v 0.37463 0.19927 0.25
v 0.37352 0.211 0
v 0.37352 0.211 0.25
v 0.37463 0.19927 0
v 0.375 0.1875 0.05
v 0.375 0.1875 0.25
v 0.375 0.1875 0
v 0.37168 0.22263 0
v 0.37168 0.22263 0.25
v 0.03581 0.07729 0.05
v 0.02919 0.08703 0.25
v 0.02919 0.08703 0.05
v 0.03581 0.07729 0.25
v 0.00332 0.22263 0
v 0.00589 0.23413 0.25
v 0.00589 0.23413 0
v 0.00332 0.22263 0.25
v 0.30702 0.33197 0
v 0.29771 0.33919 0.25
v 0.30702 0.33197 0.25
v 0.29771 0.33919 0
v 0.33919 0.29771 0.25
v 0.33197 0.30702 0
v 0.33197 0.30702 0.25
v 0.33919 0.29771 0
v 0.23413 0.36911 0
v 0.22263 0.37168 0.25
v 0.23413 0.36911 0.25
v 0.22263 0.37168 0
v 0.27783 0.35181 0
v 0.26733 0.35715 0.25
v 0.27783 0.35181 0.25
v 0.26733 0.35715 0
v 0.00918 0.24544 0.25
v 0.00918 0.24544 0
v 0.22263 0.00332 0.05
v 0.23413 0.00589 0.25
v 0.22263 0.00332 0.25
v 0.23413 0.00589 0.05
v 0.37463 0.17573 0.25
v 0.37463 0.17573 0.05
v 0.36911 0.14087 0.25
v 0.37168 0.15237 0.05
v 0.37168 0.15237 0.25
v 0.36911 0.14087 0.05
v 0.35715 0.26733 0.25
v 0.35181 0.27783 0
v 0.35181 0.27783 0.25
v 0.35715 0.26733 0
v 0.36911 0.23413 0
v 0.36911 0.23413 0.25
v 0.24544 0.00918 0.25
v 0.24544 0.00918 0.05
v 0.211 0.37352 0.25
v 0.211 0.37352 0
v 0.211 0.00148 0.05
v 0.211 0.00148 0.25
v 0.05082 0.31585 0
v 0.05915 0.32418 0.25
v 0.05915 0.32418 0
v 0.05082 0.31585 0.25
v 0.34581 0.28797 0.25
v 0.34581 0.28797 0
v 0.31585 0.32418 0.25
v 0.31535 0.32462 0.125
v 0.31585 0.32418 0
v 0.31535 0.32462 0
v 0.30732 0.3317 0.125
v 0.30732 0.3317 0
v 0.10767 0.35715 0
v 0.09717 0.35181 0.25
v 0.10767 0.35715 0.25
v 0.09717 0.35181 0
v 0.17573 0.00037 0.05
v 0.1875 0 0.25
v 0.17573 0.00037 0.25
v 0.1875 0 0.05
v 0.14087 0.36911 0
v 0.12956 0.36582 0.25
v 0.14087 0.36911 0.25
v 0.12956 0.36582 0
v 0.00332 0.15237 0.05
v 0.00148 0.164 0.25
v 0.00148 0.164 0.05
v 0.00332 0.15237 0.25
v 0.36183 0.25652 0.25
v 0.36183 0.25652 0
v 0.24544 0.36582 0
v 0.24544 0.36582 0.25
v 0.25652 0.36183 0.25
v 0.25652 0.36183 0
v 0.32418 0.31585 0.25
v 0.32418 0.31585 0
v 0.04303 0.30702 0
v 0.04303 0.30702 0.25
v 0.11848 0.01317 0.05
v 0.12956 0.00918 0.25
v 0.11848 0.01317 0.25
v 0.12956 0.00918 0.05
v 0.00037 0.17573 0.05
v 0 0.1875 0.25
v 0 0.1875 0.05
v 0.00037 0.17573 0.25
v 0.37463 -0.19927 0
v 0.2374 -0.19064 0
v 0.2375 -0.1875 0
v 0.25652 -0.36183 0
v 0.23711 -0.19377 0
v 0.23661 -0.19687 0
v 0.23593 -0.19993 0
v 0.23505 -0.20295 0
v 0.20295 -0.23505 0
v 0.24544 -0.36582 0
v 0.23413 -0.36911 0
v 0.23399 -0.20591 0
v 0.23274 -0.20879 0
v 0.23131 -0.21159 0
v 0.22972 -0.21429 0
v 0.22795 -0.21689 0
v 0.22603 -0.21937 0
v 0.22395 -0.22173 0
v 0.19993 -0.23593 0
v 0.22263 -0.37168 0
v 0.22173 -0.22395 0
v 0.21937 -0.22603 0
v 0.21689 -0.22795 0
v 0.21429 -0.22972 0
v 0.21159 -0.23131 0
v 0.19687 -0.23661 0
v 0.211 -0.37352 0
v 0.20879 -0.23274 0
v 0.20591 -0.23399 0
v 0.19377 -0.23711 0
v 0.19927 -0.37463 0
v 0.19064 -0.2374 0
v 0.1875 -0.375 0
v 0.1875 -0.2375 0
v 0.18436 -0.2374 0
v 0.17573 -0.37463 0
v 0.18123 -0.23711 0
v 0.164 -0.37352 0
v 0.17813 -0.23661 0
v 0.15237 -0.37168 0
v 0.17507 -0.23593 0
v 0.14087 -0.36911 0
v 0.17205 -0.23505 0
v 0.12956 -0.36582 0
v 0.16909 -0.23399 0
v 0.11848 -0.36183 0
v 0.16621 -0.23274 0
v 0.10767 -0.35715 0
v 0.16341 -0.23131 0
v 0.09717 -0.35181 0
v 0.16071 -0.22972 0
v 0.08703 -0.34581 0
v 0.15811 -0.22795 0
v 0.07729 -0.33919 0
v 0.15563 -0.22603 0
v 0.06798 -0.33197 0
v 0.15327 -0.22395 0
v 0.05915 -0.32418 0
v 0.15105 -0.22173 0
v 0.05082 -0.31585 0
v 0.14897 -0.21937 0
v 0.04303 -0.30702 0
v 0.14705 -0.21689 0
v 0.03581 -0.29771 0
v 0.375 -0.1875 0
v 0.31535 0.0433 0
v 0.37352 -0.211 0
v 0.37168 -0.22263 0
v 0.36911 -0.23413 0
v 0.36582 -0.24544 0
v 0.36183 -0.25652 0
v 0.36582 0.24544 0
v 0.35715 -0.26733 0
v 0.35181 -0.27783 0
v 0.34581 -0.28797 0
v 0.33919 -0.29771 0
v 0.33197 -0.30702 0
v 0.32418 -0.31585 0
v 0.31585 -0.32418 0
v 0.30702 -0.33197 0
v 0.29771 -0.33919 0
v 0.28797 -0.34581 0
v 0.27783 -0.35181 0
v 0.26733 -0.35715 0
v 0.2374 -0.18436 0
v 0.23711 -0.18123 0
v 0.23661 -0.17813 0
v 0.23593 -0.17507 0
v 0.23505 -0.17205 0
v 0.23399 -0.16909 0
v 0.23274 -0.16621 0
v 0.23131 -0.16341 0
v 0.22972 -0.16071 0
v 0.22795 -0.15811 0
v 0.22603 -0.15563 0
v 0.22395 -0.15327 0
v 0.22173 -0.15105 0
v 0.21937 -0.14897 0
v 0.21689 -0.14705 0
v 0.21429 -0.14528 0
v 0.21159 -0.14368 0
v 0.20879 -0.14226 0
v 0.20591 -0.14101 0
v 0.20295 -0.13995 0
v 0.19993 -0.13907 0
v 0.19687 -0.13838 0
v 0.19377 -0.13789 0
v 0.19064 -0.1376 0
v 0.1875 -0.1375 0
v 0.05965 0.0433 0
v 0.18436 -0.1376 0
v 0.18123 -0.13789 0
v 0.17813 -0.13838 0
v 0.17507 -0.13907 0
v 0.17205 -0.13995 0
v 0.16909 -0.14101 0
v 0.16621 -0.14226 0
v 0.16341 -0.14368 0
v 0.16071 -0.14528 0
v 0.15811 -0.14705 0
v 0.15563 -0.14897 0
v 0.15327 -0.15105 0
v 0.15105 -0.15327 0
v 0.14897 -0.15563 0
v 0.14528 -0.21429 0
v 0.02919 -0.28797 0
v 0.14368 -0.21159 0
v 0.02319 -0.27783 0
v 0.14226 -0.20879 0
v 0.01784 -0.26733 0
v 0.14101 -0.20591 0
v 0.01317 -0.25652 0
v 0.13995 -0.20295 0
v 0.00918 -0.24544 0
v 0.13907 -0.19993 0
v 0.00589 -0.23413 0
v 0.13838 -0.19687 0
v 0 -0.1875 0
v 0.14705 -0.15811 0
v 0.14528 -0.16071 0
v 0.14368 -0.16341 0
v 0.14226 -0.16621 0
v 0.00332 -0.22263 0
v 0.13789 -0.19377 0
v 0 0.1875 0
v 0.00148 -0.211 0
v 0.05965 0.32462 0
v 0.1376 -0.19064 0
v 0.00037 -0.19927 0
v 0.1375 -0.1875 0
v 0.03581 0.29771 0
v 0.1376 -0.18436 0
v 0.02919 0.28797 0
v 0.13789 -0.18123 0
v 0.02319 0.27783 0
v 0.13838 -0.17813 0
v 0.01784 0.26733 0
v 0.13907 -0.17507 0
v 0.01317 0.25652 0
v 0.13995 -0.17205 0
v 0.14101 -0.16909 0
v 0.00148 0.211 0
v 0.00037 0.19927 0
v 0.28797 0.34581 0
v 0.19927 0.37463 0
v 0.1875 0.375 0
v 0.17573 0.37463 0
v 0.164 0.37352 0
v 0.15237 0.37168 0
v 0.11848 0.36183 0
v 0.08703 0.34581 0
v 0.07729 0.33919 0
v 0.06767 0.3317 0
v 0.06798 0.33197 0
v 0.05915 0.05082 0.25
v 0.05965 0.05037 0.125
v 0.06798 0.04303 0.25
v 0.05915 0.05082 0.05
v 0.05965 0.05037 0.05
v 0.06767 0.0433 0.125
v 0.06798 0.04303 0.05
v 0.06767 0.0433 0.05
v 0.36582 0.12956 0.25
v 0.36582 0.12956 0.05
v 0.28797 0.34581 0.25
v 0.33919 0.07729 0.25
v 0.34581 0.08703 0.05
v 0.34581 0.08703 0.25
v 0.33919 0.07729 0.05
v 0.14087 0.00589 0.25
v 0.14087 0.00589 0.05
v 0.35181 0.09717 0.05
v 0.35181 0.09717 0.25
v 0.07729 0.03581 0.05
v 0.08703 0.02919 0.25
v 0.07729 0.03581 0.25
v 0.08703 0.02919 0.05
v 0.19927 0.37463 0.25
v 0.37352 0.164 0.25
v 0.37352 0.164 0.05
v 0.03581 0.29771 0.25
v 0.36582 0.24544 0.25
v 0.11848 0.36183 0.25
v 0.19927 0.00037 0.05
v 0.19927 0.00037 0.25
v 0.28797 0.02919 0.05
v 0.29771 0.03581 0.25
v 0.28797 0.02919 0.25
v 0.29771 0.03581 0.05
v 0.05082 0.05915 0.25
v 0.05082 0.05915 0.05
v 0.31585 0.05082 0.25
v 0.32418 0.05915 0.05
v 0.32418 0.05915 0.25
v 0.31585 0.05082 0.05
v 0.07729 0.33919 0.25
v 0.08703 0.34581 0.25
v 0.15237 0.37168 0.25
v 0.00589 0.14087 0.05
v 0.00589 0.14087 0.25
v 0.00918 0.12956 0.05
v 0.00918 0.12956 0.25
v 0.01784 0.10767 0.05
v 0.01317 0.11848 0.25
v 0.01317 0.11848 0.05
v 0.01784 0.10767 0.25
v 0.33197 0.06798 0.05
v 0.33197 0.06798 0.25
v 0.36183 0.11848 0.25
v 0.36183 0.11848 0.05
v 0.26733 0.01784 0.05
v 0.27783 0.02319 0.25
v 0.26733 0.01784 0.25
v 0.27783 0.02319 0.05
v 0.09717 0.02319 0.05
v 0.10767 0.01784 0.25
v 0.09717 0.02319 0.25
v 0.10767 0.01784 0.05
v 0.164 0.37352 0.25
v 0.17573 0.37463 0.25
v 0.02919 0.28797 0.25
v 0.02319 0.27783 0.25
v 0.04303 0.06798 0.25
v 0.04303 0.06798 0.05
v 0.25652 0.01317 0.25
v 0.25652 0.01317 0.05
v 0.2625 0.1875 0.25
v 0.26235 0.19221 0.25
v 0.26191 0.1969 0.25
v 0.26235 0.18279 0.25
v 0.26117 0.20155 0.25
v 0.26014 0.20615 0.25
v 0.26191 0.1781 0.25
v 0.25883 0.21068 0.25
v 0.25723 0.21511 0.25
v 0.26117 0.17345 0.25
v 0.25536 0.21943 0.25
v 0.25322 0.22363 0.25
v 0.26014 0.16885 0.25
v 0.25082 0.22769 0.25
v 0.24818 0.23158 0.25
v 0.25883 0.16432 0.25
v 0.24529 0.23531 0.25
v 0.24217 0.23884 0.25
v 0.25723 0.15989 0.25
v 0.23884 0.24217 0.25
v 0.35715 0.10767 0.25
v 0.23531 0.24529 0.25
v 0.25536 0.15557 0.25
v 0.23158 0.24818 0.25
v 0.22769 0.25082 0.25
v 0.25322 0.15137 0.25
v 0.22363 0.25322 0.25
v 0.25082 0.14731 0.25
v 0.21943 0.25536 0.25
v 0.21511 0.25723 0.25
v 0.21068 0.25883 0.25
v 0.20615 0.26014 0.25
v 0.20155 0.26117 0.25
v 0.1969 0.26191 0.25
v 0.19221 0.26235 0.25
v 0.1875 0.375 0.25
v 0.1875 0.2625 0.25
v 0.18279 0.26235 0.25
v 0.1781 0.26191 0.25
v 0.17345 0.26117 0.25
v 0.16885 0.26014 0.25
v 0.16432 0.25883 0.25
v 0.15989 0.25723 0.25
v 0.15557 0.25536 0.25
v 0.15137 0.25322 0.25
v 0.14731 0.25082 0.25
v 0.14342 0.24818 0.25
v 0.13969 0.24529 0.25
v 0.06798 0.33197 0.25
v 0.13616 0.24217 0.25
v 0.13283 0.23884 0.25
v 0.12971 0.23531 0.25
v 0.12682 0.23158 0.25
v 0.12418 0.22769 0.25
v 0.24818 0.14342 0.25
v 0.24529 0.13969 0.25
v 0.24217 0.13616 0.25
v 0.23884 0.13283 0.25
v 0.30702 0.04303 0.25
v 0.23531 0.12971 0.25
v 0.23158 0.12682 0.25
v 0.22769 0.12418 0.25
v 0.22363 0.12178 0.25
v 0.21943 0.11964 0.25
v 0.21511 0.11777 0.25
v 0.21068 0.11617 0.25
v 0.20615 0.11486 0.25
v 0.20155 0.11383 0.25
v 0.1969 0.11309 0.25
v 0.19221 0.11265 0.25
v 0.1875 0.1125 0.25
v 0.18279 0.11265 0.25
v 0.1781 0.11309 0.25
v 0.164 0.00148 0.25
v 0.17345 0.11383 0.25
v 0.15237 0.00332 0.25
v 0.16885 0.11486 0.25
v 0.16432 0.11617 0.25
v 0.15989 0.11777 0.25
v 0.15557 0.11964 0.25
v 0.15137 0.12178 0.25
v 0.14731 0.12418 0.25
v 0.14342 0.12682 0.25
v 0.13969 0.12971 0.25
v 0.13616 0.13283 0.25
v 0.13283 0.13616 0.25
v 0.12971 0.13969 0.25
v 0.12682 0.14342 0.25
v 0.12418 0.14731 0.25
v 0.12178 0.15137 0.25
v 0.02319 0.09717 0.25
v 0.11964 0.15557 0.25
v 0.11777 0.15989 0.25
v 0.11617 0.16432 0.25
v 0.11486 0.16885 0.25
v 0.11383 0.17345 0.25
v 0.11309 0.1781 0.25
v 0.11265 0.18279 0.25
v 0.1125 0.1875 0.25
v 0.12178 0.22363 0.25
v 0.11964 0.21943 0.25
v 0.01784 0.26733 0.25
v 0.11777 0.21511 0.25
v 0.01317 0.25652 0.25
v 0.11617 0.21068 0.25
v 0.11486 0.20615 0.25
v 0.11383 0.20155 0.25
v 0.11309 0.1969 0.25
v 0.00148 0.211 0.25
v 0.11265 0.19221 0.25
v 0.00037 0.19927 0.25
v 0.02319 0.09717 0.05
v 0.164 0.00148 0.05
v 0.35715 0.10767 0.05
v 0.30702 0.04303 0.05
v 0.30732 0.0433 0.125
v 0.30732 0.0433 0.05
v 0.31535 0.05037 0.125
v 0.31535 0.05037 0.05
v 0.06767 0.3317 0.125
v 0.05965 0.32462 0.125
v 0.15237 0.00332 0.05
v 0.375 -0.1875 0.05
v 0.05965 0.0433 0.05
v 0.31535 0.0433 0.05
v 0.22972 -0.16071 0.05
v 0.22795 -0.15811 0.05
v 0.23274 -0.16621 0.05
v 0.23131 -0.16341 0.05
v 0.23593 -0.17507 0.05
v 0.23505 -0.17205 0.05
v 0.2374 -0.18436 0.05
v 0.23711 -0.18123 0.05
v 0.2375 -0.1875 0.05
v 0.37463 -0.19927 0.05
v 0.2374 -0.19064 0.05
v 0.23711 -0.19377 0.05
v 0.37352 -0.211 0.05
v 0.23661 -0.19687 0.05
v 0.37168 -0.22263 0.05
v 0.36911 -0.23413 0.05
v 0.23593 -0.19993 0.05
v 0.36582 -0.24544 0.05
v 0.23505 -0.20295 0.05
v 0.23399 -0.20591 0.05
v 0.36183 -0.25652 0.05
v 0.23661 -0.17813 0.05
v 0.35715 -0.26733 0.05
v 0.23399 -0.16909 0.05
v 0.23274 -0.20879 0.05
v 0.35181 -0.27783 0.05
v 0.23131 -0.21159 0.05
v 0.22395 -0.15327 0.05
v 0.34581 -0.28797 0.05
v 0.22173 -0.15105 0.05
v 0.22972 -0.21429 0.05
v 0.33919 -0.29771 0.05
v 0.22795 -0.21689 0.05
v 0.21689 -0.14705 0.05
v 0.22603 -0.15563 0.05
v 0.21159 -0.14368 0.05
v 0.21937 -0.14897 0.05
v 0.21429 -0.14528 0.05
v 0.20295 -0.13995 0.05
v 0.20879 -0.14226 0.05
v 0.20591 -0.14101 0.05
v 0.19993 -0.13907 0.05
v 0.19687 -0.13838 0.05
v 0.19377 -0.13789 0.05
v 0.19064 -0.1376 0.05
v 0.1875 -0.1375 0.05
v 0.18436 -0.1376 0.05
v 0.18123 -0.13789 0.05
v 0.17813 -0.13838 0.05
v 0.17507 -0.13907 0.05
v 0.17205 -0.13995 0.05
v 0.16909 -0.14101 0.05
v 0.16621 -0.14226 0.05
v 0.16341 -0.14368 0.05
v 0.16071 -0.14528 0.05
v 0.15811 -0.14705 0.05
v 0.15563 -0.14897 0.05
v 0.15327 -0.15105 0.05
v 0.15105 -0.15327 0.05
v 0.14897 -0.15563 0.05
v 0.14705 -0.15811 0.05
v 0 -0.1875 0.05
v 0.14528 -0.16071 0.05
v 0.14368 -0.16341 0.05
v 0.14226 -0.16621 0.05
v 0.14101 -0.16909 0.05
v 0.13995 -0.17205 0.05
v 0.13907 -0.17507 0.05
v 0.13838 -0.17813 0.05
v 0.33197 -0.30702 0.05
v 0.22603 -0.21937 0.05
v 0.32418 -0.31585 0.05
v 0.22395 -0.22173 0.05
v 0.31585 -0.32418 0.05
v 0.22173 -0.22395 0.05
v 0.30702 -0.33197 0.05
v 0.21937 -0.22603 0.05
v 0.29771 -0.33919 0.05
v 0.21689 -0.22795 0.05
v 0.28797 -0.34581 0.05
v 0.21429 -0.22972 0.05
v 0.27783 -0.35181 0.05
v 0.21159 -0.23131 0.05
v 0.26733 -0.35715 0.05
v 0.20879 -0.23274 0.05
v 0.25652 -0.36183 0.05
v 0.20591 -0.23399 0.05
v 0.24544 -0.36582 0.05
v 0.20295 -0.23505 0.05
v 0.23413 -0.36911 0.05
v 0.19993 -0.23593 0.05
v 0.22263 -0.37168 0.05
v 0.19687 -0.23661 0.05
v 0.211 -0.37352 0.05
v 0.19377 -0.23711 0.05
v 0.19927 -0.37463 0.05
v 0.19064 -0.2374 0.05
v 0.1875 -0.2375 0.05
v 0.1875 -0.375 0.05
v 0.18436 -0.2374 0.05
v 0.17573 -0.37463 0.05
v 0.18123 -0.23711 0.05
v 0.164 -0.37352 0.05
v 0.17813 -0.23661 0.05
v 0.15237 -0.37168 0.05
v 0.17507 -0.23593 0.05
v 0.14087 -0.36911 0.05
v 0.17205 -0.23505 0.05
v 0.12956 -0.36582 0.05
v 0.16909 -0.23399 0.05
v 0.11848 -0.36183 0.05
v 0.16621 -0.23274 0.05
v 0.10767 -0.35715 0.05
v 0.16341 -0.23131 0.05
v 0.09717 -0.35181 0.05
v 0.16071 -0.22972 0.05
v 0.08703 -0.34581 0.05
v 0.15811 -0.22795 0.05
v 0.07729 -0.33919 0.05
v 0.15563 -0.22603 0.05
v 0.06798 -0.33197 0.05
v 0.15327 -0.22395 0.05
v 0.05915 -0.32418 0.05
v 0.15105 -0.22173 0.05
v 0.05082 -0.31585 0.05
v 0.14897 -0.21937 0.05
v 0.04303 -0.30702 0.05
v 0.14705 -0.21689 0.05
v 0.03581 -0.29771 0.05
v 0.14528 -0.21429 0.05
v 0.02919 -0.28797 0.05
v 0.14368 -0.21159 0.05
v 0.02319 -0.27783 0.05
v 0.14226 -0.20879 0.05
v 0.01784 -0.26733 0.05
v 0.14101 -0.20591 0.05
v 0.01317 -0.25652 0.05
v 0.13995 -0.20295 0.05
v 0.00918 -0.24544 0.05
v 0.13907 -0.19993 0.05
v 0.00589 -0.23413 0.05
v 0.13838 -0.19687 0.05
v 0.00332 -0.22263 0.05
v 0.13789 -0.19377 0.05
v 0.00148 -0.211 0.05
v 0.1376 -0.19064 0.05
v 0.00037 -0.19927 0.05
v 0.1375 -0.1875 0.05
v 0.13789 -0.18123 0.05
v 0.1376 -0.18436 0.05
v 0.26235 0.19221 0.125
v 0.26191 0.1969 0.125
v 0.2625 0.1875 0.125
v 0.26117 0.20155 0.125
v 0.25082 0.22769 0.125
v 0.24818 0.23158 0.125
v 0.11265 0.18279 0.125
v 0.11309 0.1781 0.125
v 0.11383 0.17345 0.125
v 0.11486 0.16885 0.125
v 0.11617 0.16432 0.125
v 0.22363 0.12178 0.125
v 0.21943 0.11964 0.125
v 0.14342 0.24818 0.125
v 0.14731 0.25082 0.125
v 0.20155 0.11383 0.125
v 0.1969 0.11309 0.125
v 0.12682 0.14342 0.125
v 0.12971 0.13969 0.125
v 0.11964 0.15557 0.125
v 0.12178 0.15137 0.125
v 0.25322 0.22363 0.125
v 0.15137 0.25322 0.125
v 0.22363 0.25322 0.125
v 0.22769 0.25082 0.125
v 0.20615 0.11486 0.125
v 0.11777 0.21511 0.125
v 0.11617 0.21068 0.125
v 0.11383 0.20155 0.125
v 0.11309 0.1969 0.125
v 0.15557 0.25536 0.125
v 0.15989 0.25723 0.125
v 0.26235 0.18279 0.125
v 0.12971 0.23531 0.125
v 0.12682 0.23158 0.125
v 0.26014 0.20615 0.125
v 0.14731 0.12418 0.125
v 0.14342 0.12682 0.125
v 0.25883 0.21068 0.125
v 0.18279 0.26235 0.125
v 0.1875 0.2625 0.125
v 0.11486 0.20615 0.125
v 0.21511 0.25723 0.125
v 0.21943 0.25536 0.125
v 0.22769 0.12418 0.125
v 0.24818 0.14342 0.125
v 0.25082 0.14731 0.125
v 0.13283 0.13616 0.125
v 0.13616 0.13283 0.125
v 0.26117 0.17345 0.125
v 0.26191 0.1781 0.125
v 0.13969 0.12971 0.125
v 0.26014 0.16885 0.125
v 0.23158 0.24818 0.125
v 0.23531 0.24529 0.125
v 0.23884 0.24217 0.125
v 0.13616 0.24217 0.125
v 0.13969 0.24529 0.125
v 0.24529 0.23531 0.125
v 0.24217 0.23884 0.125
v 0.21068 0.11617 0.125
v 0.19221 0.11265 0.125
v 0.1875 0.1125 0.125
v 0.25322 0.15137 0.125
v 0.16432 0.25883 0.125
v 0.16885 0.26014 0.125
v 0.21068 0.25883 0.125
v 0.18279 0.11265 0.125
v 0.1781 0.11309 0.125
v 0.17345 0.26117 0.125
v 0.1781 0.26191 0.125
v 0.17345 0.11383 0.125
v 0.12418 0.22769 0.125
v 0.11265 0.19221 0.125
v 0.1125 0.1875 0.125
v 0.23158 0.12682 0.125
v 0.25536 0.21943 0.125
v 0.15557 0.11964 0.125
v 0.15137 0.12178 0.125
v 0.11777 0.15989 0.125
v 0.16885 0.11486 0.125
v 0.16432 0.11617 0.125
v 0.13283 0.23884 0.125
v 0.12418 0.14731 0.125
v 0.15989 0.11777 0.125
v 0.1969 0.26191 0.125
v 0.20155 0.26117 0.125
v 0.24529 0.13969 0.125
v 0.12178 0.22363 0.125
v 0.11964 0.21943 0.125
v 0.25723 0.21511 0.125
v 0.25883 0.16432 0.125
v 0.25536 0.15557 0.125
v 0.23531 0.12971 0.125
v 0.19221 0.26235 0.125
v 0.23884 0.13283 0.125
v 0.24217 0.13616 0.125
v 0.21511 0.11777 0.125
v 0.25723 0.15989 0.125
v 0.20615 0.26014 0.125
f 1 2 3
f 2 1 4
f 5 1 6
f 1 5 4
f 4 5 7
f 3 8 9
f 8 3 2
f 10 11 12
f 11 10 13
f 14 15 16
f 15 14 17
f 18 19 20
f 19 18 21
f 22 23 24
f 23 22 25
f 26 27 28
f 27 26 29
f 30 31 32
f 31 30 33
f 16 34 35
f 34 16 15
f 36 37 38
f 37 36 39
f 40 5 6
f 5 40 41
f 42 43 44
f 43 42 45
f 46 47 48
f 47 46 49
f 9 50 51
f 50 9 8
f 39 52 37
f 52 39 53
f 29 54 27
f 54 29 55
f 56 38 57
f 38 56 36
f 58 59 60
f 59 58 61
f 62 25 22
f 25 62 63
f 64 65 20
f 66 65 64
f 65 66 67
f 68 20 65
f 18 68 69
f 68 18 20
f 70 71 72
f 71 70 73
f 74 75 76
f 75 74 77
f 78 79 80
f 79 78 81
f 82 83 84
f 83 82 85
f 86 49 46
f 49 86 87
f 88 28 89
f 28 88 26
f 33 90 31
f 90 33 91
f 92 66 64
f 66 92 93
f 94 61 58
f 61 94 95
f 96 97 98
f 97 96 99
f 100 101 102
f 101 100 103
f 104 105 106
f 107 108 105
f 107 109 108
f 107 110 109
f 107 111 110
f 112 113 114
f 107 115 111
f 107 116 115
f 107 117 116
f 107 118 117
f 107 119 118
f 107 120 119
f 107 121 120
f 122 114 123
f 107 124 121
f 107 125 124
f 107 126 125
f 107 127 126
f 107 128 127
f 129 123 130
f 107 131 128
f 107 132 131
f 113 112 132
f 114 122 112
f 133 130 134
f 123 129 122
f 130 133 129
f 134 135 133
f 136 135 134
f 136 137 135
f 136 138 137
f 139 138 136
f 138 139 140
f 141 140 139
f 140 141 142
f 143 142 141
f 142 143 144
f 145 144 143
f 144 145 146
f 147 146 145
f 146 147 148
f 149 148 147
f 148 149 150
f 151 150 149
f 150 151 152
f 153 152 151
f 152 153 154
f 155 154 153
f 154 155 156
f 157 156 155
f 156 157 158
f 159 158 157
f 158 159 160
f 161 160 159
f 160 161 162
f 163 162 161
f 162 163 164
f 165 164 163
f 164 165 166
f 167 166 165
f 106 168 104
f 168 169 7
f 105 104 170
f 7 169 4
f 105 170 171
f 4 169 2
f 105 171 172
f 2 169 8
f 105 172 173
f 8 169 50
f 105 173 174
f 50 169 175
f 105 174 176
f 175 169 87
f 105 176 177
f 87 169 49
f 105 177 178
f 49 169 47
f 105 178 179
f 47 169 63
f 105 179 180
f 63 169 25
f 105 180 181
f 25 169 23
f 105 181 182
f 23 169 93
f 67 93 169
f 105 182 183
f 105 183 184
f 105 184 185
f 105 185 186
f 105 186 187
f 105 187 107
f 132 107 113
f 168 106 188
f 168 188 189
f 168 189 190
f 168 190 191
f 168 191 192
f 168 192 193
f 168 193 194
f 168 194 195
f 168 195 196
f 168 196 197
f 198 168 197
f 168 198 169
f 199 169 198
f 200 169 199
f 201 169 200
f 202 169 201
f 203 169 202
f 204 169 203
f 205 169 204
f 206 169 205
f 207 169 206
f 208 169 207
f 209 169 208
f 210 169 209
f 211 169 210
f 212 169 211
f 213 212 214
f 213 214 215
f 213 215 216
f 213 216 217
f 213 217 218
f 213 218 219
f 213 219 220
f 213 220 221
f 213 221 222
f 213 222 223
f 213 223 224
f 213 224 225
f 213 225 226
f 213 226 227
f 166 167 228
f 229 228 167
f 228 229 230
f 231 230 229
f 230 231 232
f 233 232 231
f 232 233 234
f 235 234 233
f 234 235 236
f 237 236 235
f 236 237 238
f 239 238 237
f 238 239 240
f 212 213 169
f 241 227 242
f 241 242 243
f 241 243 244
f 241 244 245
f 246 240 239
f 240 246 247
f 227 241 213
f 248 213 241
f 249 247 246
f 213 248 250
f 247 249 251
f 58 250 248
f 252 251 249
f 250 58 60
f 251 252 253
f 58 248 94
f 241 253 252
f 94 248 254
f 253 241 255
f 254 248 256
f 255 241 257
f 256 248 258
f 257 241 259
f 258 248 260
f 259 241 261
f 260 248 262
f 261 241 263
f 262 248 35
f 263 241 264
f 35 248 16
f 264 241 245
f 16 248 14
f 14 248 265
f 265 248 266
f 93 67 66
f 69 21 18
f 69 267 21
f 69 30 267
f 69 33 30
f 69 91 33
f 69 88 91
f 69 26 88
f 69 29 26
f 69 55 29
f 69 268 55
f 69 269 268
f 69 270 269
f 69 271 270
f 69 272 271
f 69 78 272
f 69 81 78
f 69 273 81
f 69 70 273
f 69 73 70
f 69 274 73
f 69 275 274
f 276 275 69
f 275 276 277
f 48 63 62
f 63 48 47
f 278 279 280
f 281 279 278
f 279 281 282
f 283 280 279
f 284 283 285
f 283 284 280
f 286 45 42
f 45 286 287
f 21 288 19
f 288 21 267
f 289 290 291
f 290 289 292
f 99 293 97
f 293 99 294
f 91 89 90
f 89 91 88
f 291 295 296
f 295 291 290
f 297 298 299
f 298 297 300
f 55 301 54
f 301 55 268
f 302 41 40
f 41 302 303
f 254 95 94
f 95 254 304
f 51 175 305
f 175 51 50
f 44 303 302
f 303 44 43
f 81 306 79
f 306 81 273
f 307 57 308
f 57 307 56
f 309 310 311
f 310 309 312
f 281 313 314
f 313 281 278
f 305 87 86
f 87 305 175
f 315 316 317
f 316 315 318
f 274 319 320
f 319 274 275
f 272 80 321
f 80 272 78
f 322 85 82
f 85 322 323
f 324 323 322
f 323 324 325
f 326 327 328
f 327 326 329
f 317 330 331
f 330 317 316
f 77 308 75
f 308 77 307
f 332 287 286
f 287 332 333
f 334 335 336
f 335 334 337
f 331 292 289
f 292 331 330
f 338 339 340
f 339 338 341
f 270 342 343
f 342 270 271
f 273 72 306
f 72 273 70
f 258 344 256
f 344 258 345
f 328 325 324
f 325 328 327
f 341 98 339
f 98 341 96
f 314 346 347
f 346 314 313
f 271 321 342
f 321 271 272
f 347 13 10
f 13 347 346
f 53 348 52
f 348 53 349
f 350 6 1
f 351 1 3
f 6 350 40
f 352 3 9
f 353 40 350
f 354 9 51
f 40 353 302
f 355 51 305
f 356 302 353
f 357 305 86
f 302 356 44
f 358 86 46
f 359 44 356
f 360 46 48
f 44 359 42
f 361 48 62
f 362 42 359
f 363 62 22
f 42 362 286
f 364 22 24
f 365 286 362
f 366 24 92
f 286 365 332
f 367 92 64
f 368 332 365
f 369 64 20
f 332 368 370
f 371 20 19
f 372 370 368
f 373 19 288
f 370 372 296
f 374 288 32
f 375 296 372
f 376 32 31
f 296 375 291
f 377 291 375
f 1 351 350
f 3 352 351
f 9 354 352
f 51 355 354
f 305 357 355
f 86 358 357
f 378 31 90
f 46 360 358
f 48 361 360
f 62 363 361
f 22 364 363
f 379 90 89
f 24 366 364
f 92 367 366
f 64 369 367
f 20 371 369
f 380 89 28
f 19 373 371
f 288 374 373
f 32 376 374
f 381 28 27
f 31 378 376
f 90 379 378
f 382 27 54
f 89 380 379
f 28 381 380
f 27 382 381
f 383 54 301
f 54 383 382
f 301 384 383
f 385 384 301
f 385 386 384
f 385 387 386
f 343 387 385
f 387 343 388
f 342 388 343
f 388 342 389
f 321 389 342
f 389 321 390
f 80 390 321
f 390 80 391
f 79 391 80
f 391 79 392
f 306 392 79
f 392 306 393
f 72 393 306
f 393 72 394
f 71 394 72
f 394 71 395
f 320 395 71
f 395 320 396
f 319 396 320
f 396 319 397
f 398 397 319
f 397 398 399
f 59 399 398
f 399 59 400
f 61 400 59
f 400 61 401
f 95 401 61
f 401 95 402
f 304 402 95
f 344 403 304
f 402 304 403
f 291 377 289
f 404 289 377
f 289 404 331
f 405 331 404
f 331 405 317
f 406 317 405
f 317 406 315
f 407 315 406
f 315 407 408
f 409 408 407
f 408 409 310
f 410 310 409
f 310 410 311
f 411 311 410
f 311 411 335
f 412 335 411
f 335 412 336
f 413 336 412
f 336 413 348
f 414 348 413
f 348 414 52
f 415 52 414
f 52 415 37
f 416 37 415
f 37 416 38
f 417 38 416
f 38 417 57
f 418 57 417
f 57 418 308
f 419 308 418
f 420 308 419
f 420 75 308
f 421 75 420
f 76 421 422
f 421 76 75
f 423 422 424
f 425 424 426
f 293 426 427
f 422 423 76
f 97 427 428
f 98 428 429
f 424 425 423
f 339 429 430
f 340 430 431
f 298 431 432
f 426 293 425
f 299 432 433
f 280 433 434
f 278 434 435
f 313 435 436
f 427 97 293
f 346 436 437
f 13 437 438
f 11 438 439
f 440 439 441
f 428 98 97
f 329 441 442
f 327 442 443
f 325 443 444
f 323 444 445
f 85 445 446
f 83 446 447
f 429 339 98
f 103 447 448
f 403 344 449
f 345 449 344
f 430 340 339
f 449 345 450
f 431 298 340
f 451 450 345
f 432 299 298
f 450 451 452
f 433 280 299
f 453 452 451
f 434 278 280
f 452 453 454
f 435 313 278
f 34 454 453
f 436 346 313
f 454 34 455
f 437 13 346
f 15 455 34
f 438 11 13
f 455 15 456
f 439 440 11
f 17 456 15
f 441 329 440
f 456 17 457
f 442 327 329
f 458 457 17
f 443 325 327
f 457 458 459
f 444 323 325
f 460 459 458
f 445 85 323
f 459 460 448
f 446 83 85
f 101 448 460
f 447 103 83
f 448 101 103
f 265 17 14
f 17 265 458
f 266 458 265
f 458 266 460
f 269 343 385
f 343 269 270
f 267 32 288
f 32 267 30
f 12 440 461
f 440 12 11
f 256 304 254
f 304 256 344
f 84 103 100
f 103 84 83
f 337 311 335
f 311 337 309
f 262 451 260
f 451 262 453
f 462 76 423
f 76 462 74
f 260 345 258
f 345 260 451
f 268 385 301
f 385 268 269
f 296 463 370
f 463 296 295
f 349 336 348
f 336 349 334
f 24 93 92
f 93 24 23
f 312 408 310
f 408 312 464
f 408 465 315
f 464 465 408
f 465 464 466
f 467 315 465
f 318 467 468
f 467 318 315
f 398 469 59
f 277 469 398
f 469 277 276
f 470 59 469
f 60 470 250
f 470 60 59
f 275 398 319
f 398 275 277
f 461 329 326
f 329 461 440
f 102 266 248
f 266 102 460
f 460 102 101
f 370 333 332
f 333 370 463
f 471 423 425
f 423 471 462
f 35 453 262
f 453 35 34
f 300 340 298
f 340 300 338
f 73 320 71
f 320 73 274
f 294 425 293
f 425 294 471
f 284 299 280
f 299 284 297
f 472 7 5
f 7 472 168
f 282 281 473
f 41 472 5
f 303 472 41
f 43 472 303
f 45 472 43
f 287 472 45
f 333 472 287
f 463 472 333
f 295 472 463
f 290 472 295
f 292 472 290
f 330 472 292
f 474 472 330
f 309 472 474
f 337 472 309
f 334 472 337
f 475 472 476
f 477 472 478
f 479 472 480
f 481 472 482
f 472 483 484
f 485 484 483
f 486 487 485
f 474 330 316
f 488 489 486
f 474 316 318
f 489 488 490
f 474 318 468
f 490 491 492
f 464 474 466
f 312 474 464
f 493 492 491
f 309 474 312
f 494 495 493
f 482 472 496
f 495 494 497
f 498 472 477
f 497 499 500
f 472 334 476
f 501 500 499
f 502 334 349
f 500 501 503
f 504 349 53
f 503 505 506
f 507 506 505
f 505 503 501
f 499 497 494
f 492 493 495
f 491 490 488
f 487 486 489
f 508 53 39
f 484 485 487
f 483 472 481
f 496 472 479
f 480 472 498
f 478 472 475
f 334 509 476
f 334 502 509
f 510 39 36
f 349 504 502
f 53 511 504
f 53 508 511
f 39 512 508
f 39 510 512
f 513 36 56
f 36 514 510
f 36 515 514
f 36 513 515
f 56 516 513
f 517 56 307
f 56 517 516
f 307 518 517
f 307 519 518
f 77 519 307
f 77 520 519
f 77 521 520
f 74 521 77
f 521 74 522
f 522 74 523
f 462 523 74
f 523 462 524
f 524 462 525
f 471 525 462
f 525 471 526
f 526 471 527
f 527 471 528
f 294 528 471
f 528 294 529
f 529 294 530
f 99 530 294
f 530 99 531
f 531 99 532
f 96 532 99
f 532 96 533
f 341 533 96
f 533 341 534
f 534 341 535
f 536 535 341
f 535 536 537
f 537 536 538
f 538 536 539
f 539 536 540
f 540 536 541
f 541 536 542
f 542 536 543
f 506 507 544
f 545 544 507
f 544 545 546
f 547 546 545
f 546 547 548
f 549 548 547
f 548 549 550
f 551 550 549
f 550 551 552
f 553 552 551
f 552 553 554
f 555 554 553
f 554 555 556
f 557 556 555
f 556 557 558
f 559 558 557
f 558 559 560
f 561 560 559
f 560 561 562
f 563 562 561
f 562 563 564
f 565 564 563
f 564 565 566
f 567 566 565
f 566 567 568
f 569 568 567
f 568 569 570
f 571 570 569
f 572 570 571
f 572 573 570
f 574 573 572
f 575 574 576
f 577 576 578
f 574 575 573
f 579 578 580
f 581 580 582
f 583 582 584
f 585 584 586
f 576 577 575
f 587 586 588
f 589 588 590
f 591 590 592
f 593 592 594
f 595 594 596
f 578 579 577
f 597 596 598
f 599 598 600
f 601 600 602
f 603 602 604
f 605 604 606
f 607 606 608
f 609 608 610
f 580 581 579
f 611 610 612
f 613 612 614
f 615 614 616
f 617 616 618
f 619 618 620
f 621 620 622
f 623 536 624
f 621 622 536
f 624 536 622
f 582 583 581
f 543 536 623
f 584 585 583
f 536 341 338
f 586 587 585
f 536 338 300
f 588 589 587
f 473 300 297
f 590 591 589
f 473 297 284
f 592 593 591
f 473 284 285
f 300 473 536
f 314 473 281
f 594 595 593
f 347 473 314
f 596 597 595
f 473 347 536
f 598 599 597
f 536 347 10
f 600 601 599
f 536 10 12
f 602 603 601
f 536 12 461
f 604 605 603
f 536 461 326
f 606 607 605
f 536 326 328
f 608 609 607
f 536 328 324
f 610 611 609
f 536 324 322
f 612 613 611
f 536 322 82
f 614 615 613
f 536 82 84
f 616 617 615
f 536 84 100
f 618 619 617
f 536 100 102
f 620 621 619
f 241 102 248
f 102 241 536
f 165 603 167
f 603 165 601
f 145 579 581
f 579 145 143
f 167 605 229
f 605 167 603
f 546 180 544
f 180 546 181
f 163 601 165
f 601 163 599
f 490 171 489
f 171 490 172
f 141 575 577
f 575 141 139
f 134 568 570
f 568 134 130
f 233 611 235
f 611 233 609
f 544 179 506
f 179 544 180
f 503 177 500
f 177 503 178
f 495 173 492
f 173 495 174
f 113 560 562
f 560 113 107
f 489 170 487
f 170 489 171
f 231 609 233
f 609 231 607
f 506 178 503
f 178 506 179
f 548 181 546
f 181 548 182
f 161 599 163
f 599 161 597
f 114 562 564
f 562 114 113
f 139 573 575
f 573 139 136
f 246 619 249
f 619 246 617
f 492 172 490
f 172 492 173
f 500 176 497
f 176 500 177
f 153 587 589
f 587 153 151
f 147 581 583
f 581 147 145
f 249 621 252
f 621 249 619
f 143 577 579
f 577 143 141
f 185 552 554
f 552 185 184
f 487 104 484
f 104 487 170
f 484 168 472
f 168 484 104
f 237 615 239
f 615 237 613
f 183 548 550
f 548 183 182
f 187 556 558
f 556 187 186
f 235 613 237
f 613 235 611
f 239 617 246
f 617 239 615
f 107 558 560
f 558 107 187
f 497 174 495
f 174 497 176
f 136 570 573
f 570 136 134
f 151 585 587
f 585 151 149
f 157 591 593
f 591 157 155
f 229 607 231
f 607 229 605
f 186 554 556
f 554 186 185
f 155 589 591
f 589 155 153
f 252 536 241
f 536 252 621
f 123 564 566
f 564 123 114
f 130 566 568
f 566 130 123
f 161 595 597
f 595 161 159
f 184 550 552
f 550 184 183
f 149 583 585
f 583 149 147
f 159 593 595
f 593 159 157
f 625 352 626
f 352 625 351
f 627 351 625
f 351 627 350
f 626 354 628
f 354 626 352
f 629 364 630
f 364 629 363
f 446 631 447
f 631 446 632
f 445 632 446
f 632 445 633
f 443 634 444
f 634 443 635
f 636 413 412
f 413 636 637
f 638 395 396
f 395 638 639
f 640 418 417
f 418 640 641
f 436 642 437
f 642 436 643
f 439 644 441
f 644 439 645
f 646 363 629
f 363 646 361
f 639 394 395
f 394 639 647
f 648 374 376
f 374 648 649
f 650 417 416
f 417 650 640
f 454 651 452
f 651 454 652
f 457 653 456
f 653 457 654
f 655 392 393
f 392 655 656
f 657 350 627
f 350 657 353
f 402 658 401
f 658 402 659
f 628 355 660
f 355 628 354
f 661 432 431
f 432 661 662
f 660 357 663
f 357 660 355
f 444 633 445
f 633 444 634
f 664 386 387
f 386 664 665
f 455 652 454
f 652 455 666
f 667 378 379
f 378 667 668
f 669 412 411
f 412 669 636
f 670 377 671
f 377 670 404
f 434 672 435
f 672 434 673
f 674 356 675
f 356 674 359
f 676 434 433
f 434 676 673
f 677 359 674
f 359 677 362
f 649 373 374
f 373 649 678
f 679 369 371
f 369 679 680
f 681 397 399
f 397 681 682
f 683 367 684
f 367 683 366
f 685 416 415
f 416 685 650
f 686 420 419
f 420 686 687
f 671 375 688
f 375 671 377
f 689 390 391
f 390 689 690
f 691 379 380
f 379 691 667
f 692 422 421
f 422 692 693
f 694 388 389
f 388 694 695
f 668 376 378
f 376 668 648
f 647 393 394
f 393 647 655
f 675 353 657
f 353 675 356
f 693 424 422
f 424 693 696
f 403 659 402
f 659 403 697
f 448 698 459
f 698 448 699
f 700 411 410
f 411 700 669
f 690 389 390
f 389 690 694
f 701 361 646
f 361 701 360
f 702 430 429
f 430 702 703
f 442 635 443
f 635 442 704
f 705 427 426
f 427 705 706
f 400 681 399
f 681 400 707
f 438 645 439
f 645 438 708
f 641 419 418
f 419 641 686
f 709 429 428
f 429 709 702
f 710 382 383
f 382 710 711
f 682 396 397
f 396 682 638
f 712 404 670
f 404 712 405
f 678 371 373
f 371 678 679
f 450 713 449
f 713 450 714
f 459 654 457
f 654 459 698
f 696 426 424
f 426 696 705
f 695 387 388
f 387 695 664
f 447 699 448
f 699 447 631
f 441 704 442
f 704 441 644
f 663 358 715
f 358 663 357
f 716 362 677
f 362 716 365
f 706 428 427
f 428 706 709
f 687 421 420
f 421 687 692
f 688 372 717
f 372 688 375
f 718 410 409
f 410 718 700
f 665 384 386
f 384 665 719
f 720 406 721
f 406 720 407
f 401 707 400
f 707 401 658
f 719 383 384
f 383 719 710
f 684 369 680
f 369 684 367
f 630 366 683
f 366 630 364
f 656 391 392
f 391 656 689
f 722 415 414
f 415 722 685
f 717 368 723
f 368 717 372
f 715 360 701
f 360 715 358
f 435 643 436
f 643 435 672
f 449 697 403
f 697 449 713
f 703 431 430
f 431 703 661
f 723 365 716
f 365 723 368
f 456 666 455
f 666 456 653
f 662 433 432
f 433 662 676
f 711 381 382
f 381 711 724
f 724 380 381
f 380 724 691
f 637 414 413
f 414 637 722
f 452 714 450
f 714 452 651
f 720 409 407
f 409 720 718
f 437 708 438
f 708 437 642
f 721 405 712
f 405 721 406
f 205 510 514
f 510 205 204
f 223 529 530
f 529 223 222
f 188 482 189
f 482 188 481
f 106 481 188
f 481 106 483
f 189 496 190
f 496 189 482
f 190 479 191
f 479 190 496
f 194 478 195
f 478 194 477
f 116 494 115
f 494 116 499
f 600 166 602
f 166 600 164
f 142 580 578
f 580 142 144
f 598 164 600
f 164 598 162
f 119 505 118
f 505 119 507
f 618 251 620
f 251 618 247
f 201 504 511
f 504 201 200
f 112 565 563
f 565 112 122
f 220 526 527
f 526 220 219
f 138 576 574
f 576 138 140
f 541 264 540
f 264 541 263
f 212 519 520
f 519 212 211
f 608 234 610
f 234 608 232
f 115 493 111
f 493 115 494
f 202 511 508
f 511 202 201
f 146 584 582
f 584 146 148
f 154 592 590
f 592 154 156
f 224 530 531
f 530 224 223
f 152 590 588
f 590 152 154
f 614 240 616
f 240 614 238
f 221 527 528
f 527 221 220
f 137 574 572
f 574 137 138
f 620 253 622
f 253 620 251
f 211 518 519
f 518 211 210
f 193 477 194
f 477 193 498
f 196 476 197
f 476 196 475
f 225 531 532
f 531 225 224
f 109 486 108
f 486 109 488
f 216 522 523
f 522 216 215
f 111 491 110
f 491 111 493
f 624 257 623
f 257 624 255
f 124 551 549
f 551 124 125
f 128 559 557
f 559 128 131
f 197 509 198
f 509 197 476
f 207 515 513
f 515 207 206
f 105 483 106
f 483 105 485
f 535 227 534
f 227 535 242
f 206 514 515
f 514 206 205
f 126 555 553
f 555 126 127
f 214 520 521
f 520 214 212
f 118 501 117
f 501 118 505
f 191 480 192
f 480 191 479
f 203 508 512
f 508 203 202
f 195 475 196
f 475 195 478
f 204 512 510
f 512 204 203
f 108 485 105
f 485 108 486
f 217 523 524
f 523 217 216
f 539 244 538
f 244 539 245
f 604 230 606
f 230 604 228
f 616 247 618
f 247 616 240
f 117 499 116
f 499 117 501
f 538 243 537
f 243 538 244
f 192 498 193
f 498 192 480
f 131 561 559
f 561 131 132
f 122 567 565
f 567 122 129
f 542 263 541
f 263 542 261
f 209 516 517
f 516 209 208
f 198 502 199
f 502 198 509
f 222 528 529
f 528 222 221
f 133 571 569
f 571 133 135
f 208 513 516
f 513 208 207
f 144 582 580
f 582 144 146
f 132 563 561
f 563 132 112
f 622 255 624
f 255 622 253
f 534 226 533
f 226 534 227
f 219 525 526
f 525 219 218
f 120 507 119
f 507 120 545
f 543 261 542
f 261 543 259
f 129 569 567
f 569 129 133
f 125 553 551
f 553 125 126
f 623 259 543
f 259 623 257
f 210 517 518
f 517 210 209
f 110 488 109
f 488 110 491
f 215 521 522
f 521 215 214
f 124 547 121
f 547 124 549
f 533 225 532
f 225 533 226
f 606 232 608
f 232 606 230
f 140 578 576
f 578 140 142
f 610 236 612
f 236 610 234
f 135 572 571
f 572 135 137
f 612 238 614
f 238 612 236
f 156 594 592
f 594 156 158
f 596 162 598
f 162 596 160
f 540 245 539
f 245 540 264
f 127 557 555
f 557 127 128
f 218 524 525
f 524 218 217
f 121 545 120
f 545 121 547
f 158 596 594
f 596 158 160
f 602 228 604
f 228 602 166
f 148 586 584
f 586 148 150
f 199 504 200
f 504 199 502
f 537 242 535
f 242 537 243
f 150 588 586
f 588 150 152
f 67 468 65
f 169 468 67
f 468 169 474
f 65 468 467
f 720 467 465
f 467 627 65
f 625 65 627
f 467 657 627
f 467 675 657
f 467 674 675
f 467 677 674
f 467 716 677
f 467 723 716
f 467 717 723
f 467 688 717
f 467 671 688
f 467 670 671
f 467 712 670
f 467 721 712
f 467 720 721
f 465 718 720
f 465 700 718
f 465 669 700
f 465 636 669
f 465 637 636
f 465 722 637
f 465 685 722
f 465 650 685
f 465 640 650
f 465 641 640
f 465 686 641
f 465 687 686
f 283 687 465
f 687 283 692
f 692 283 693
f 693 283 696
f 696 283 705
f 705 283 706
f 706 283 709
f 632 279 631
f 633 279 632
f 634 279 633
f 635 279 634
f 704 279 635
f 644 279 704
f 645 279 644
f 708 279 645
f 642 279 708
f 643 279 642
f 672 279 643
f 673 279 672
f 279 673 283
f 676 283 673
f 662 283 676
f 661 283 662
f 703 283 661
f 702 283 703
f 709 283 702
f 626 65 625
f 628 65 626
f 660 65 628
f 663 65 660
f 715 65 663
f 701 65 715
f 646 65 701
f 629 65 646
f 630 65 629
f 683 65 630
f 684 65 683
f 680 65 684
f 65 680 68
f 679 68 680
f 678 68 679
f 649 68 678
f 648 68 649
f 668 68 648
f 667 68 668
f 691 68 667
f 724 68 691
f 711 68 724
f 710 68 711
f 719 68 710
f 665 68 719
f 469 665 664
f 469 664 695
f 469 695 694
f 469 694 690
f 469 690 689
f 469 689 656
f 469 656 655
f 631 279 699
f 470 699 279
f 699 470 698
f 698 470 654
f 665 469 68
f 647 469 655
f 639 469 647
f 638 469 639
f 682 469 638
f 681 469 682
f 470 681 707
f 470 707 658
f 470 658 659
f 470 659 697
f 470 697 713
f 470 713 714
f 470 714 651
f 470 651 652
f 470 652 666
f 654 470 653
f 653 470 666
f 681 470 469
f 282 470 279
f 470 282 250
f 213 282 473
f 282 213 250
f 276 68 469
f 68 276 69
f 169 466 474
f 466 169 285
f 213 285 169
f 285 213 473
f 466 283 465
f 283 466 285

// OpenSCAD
// ==========================================
// Parametric Variables
// ==========================================

// Main Reference Dimensions
main_length = 0.375;
main_width = 0.375;
main_height = 0.25;

// Main Annular Cylinder
main_cx = 0.1875;
main_cy = 0.1875;
main_outer_r = 0.1875;
main_bore_r = 0.075;

// Shallow Attached Annular Tab
tab_cx = 0.1875;
tab_cy = -0.1875;
tab_outer_r = 0.1875;
tab_bore_r = 0.05;
tab_height = 0.05;

// Underside Recess / Cut
recess_w = 0.2557; // X dimension footprint
recess_l = 0.2884; // Y dimension footprint
recess_h = 0.125;  // Height of the removed band from underside

// Resolution for smooth curves
$fn = 100;

// ==========================================
// Module Definitions
// ==========================================

// Module for the complete annular assembly
module annular_assembly() {
    difference() {
        // 1. Combine solid bodies
        union() {
            // Main annular cylinder
            // Centered at (0.1875, 0.1875) with height 0.25
            translate([main_cx, main_cy, 0])
                cylinder(h=main_height, r=main_outer_r);

            // Shallow attached annular tab
            // A straight rectangular body connecting the tab center to the main cylinder center
            // Bounding span: X from 0 to 0.375, Y from -0.1875 to 0.1875
            translate([0, tab_cy, 0])
                cube([main_length, main_cy - tab_cy, tab_height]);

            // Circular outer profile of the tab
            // Centered at (0.1875, -0.1875) with height 0.05
            translate([tab_cx, tab_cy, 0])
                cylinder(h=tab_height, r=tab_outer_r);
        }

        // 2. Subtractive operations (Holes and Recesses)
        
        // Main central through bore
        // Extended slightly in Z to ensure clean manifold cuts
        translate([main_cx, main_cy, -0.01])
            cylinder(h=main_height + 0.02, r=main_bore_r);

        // Tab central through opening
        translate([tab_cx, tab_cy, -0.01])
            cylinder(h=tab_height + 0.02, r=tab_bore_r);

        // Removed underside recess/cut
        // Bounded footprint 0.2557 by 0.2884, centered on the main axis
        translate([main_cx, main_cy, 0])
            translate([-recess_w/2, -recess_l/2, -0.01])
                cube([recess_w, recess_l, recess_h + 0.01]);

        // Circular cut profile band associated with the main bore
        // Runs from 0 to 0.125 measured upward from the base underside
        translate([main_cx, main_cy, -0.01])
            cylinder(h=recess_h + 0.01, r=main_bore_r);
    }
}

// ==========================================
// Main Execution
// ==========================================

// Instantiate the modeled component
color("steelblue")
    annular_assembly();
